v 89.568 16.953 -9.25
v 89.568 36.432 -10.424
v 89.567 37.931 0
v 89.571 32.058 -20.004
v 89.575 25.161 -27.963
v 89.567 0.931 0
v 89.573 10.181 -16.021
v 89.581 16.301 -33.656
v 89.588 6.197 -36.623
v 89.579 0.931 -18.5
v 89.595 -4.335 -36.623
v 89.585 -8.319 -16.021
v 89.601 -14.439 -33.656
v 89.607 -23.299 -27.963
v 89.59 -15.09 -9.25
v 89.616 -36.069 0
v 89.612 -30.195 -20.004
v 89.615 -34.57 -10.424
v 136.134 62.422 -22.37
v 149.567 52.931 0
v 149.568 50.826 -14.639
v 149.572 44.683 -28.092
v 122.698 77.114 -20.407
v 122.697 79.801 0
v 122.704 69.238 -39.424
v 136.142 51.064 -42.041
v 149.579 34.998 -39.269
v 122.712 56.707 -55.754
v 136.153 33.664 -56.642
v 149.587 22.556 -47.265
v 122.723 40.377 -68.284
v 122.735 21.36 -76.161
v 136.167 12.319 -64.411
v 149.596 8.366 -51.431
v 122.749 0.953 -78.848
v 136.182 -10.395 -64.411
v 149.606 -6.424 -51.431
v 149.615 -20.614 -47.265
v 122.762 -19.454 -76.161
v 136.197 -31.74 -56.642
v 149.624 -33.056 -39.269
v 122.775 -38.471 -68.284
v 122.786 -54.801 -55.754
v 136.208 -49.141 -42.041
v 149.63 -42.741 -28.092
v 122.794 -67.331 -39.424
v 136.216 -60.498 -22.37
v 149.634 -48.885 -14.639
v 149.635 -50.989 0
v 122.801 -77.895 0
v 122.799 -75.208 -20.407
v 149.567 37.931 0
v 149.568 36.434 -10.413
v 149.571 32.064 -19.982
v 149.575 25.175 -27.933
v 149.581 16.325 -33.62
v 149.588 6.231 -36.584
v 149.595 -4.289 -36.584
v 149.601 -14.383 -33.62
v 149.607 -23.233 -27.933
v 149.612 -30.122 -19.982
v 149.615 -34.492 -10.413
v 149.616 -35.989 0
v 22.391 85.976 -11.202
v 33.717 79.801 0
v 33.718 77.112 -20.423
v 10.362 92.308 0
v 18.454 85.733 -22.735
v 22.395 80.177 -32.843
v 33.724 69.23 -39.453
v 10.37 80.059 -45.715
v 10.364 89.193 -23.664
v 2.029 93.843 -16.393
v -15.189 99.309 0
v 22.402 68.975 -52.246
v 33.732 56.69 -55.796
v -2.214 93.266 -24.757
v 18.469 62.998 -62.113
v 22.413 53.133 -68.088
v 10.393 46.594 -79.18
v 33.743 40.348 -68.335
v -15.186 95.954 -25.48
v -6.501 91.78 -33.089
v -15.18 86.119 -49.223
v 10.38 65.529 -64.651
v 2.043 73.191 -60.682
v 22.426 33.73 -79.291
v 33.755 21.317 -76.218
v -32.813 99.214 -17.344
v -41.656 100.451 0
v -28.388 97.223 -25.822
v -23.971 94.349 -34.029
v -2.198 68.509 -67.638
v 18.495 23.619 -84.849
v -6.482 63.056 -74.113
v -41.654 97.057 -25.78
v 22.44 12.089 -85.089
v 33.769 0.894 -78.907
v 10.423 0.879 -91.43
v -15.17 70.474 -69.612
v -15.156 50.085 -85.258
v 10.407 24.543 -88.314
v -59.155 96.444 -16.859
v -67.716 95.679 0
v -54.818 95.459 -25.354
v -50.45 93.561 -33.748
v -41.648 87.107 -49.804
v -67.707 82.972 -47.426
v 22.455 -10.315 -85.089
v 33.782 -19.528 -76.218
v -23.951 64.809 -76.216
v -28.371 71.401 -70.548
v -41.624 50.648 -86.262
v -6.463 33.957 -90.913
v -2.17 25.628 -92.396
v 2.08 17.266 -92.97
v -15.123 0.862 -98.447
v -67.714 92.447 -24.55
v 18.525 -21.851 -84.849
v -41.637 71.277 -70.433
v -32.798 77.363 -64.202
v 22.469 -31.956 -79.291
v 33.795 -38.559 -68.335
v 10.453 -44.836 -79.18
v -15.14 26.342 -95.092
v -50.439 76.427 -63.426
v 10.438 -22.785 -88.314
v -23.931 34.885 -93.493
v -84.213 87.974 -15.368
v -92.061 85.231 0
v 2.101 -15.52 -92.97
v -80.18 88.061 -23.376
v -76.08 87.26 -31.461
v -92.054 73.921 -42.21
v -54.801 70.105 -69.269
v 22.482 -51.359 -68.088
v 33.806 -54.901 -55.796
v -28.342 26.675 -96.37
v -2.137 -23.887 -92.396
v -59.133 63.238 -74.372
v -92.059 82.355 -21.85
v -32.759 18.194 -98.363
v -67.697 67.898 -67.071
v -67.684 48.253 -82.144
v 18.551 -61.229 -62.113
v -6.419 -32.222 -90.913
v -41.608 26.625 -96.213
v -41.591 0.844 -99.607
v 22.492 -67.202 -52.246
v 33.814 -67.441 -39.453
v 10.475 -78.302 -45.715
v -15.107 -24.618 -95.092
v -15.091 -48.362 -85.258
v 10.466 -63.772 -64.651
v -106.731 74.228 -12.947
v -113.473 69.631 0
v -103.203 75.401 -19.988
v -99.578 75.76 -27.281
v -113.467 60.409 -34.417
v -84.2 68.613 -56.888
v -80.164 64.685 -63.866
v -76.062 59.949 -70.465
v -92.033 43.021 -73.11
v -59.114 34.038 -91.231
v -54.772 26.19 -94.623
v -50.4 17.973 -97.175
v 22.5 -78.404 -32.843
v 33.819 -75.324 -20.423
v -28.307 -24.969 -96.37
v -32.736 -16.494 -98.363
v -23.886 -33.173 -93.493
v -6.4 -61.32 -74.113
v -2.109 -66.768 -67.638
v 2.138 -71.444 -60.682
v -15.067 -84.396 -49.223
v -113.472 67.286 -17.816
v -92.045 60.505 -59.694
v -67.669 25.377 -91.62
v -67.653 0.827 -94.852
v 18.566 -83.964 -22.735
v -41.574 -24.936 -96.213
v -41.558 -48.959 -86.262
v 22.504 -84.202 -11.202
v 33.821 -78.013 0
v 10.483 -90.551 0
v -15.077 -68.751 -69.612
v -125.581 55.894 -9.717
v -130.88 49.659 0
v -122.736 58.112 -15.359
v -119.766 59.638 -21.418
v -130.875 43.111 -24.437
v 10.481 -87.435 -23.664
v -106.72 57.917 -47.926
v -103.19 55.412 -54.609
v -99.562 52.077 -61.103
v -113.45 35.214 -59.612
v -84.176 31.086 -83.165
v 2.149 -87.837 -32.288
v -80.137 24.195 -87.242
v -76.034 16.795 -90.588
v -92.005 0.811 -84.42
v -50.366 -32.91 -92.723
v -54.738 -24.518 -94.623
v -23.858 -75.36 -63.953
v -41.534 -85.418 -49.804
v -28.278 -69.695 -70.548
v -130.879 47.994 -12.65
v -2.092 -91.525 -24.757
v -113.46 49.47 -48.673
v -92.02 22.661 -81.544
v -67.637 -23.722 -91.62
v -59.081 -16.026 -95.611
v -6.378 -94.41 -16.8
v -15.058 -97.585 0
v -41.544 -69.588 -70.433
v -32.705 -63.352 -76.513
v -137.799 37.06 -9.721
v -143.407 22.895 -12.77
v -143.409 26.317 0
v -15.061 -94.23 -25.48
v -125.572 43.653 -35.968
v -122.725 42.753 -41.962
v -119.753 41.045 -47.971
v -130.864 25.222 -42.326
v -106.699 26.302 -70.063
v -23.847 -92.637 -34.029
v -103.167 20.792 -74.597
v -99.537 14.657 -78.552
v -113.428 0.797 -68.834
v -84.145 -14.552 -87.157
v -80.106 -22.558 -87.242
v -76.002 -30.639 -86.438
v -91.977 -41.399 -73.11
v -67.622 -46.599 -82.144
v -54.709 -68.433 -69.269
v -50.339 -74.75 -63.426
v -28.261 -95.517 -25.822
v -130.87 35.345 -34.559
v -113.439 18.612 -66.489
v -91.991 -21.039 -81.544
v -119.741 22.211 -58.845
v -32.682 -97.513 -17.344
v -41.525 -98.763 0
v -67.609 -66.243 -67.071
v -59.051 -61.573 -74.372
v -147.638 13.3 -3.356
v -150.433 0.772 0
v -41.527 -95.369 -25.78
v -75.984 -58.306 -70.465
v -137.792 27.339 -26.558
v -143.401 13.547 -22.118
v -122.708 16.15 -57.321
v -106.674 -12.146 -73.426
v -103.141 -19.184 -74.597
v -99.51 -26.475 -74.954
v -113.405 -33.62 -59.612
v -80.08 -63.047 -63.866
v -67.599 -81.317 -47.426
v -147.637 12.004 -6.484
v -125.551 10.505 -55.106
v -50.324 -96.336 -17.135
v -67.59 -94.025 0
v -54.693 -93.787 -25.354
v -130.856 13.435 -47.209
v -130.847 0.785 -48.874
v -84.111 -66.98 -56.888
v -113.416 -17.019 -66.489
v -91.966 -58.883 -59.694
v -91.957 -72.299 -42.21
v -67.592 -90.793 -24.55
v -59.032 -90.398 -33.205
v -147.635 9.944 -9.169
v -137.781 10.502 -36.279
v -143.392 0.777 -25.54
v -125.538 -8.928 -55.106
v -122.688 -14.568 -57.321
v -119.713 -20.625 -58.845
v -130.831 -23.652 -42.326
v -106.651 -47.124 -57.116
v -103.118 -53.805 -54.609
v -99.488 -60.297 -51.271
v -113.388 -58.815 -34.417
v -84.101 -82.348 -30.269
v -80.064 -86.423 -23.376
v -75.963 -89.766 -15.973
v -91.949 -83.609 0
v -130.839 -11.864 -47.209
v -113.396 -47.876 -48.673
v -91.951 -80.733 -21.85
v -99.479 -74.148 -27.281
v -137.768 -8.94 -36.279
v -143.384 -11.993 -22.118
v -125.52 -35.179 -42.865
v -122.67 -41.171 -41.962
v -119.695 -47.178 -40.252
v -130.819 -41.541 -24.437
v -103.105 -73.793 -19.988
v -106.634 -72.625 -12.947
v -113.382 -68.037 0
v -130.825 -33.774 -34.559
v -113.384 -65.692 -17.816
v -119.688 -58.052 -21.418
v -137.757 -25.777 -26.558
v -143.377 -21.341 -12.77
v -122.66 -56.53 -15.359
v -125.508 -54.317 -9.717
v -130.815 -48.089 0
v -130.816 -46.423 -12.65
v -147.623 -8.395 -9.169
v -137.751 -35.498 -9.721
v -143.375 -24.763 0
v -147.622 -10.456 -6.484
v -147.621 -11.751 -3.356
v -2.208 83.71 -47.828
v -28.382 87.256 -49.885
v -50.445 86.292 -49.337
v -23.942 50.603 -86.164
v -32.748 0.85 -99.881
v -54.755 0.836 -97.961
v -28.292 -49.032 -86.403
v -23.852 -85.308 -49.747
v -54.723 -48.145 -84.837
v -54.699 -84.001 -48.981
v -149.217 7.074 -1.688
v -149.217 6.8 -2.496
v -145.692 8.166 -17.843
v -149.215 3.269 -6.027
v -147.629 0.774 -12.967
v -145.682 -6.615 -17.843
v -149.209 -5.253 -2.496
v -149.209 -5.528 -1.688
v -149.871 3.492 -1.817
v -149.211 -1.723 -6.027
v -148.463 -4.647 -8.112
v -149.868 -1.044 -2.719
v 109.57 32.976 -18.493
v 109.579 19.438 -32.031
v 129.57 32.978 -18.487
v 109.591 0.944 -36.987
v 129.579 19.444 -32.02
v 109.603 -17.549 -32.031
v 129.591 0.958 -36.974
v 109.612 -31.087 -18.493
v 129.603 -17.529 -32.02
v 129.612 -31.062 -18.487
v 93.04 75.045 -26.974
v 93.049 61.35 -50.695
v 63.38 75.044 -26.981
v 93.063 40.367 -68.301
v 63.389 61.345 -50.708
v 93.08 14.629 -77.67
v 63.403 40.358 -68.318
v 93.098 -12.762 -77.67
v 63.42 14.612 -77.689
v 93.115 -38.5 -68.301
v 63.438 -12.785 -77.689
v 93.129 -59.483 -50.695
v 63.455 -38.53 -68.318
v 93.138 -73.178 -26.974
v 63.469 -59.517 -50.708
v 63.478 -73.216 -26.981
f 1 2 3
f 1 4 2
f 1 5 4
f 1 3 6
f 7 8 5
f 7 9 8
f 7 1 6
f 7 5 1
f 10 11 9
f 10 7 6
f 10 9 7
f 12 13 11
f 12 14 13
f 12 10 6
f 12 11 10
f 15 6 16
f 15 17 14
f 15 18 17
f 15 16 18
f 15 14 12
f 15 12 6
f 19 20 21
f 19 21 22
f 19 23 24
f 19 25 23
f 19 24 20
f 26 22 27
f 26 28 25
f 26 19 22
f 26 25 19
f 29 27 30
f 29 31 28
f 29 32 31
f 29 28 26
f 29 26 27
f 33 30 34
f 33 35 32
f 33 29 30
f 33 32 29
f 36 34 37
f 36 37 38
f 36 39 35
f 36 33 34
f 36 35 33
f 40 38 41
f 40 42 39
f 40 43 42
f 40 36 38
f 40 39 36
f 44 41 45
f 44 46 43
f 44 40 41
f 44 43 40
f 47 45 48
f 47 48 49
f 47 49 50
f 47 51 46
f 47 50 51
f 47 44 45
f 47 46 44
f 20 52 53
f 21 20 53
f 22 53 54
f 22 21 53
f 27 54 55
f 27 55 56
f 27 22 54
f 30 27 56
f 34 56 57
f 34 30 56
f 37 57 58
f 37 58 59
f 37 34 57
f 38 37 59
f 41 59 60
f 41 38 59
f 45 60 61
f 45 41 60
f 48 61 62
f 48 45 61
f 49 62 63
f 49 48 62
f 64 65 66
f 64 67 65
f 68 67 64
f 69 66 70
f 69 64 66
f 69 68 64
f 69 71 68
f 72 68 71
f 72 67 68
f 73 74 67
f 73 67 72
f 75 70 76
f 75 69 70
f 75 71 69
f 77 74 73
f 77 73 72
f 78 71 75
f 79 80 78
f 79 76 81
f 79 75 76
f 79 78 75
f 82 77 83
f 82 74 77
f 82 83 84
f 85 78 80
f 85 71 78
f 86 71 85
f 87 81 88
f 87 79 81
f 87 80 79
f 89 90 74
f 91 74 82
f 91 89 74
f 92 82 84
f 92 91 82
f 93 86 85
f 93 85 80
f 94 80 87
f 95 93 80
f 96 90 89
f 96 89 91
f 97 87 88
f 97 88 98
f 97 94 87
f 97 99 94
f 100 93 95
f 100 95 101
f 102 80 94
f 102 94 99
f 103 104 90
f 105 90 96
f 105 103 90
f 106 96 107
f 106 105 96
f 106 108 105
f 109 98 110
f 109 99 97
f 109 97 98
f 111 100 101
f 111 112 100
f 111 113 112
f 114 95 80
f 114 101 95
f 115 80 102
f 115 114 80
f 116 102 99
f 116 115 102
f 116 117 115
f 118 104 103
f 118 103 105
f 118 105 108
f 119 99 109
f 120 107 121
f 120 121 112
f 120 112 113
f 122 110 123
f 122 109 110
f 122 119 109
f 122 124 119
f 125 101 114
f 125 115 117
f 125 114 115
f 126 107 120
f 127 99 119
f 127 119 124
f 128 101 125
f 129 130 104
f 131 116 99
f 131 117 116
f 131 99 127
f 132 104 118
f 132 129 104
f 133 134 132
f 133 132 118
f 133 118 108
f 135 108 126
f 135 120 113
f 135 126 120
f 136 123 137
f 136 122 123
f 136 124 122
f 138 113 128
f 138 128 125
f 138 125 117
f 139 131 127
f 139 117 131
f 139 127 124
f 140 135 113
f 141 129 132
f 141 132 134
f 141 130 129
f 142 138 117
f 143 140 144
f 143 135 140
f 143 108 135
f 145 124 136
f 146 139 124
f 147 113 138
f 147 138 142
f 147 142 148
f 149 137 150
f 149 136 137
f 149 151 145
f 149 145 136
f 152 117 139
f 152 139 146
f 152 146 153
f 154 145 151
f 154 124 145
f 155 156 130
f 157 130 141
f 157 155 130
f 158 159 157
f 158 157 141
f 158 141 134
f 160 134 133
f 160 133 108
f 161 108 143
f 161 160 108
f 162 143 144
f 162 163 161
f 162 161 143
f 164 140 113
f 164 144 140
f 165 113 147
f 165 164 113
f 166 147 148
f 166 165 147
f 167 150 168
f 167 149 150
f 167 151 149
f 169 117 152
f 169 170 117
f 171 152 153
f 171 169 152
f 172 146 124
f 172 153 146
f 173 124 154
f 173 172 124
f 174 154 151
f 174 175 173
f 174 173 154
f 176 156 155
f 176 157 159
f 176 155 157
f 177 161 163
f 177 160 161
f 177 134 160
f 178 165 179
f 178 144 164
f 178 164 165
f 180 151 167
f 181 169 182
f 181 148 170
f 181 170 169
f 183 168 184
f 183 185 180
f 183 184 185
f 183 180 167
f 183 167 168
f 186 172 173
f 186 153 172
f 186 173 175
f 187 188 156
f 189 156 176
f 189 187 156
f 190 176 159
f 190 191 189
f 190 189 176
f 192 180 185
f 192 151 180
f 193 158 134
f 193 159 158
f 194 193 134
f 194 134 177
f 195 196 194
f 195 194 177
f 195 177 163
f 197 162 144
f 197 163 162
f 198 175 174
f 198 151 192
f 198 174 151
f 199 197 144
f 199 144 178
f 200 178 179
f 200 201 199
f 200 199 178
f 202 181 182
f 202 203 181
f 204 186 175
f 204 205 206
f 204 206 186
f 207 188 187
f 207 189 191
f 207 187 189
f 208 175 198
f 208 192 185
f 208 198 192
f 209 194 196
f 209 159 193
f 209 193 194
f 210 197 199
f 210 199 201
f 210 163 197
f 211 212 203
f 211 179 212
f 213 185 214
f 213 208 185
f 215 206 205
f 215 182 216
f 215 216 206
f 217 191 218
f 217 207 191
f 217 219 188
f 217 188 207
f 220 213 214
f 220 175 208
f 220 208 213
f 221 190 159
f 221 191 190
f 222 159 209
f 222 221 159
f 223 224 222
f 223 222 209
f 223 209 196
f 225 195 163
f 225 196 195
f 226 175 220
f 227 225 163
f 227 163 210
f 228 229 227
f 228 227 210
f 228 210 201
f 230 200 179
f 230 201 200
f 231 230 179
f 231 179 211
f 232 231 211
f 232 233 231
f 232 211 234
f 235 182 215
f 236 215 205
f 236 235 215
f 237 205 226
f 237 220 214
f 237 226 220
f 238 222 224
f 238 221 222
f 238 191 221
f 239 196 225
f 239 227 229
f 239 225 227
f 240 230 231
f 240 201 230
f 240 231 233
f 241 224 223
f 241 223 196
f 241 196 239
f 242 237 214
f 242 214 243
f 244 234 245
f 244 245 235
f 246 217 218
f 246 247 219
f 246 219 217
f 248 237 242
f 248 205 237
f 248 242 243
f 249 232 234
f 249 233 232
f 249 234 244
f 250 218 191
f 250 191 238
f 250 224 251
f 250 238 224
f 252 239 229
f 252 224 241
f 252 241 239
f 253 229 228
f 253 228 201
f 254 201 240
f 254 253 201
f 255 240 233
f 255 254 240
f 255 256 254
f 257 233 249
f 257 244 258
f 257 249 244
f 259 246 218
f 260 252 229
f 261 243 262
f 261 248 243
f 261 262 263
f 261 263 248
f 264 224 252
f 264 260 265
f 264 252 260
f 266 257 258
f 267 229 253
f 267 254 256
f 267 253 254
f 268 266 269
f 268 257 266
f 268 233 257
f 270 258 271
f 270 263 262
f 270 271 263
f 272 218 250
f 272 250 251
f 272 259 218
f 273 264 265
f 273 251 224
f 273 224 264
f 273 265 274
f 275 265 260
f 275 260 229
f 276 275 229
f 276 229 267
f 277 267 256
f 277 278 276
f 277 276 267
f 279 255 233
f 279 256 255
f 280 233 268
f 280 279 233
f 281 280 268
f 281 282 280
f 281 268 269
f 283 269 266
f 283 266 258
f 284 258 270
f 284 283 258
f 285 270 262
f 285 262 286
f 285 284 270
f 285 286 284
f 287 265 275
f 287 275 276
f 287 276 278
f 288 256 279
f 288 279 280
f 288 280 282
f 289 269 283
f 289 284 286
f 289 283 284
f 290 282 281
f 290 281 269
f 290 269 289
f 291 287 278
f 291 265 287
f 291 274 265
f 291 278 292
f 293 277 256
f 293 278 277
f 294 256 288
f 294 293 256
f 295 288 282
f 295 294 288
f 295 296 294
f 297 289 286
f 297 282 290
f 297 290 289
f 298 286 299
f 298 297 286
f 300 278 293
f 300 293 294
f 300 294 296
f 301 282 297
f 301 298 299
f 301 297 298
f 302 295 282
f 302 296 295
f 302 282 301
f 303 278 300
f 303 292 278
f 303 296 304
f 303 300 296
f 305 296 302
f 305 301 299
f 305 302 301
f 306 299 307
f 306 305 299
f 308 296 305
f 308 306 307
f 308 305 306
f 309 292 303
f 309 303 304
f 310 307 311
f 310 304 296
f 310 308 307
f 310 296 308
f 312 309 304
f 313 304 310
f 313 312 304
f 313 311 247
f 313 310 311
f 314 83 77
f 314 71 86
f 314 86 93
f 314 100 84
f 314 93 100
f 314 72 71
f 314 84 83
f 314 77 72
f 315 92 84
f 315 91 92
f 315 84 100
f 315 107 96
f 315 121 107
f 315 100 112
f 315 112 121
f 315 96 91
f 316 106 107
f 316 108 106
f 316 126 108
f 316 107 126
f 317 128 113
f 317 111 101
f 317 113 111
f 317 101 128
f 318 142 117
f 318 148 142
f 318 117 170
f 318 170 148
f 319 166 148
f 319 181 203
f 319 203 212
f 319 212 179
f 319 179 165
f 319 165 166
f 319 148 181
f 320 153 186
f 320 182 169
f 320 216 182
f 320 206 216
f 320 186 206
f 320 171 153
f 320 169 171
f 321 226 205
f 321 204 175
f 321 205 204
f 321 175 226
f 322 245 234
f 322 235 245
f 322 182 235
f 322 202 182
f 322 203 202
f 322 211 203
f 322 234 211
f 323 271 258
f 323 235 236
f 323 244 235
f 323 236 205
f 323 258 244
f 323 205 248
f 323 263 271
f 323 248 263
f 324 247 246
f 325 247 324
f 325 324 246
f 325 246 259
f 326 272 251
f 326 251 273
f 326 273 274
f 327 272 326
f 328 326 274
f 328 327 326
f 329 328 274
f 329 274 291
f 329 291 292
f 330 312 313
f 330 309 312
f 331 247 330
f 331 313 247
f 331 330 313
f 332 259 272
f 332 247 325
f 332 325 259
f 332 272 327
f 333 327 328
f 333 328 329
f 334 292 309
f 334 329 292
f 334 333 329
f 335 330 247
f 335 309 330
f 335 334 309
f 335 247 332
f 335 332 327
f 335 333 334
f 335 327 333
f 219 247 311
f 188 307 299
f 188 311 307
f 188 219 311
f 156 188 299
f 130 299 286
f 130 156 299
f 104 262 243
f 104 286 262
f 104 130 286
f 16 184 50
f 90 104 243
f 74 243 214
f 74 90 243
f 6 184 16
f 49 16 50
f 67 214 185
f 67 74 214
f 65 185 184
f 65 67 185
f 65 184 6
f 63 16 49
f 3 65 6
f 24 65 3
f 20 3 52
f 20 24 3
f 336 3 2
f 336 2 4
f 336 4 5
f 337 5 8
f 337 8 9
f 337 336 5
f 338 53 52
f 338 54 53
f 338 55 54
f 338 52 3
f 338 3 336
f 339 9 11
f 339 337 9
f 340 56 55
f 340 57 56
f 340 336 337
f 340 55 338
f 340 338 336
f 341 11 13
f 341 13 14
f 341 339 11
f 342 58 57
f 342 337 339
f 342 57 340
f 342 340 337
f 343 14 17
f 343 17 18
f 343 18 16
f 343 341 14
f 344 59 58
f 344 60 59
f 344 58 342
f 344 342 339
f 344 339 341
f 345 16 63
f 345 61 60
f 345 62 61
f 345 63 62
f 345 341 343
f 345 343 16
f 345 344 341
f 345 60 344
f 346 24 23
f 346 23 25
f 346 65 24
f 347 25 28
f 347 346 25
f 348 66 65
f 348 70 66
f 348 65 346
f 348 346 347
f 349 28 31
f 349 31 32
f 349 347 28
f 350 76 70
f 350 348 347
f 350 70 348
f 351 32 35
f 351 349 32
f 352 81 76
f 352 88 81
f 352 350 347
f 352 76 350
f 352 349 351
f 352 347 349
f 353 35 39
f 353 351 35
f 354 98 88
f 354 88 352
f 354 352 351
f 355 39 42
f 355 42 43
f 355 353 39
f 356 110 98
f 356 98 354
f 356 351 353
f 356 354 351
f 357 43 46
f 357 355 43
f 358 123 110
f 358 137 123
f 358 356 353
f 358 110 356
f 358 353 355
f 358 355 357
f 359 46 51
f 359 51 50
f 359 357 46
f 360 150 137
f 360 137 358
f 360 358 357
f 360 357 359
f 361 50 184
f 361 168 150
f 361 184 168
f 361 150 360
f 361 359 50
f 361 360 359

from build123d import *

# Parameters (mm, degrees)
REVOLVE1_ANGLE = 180


with BuildPart() as part:
    # Sketch2 → Revolve1 (revolve)
    with BuildSketch(Plane.XY):
        with BuildLine():
            Line((89.566728342, 37.93112192), (149.566728342, 37.93112192))
            Line((149.566728342, 37.93112192), (149.566728342, 52.93112192))
            Line((149.566728342, 52.93112192), (122.696670657, 79.801179605))
            Line((122.696670657, 79.801179605), (33.716670657, 79.801179605))
            ThreePointArc((33.716670657, 79.801179605), (-80.181557206, 91.138612278), (-150.433219191, 0.772425691))
            Line((-150.433219191, 0.772425691), (89.566728342, 0.93112192))
            Line((89.566728342, 0.93112192), (89.566728342, 37.93112192))
        make_face()
    revolve(axis=Axis((89.566728342, 0.93112192, 0), (-0.9999997813845841, -0.0006612342883058576, 0)), revolution_arc=REVOLVE1_ANGLE)


solid = part.part
